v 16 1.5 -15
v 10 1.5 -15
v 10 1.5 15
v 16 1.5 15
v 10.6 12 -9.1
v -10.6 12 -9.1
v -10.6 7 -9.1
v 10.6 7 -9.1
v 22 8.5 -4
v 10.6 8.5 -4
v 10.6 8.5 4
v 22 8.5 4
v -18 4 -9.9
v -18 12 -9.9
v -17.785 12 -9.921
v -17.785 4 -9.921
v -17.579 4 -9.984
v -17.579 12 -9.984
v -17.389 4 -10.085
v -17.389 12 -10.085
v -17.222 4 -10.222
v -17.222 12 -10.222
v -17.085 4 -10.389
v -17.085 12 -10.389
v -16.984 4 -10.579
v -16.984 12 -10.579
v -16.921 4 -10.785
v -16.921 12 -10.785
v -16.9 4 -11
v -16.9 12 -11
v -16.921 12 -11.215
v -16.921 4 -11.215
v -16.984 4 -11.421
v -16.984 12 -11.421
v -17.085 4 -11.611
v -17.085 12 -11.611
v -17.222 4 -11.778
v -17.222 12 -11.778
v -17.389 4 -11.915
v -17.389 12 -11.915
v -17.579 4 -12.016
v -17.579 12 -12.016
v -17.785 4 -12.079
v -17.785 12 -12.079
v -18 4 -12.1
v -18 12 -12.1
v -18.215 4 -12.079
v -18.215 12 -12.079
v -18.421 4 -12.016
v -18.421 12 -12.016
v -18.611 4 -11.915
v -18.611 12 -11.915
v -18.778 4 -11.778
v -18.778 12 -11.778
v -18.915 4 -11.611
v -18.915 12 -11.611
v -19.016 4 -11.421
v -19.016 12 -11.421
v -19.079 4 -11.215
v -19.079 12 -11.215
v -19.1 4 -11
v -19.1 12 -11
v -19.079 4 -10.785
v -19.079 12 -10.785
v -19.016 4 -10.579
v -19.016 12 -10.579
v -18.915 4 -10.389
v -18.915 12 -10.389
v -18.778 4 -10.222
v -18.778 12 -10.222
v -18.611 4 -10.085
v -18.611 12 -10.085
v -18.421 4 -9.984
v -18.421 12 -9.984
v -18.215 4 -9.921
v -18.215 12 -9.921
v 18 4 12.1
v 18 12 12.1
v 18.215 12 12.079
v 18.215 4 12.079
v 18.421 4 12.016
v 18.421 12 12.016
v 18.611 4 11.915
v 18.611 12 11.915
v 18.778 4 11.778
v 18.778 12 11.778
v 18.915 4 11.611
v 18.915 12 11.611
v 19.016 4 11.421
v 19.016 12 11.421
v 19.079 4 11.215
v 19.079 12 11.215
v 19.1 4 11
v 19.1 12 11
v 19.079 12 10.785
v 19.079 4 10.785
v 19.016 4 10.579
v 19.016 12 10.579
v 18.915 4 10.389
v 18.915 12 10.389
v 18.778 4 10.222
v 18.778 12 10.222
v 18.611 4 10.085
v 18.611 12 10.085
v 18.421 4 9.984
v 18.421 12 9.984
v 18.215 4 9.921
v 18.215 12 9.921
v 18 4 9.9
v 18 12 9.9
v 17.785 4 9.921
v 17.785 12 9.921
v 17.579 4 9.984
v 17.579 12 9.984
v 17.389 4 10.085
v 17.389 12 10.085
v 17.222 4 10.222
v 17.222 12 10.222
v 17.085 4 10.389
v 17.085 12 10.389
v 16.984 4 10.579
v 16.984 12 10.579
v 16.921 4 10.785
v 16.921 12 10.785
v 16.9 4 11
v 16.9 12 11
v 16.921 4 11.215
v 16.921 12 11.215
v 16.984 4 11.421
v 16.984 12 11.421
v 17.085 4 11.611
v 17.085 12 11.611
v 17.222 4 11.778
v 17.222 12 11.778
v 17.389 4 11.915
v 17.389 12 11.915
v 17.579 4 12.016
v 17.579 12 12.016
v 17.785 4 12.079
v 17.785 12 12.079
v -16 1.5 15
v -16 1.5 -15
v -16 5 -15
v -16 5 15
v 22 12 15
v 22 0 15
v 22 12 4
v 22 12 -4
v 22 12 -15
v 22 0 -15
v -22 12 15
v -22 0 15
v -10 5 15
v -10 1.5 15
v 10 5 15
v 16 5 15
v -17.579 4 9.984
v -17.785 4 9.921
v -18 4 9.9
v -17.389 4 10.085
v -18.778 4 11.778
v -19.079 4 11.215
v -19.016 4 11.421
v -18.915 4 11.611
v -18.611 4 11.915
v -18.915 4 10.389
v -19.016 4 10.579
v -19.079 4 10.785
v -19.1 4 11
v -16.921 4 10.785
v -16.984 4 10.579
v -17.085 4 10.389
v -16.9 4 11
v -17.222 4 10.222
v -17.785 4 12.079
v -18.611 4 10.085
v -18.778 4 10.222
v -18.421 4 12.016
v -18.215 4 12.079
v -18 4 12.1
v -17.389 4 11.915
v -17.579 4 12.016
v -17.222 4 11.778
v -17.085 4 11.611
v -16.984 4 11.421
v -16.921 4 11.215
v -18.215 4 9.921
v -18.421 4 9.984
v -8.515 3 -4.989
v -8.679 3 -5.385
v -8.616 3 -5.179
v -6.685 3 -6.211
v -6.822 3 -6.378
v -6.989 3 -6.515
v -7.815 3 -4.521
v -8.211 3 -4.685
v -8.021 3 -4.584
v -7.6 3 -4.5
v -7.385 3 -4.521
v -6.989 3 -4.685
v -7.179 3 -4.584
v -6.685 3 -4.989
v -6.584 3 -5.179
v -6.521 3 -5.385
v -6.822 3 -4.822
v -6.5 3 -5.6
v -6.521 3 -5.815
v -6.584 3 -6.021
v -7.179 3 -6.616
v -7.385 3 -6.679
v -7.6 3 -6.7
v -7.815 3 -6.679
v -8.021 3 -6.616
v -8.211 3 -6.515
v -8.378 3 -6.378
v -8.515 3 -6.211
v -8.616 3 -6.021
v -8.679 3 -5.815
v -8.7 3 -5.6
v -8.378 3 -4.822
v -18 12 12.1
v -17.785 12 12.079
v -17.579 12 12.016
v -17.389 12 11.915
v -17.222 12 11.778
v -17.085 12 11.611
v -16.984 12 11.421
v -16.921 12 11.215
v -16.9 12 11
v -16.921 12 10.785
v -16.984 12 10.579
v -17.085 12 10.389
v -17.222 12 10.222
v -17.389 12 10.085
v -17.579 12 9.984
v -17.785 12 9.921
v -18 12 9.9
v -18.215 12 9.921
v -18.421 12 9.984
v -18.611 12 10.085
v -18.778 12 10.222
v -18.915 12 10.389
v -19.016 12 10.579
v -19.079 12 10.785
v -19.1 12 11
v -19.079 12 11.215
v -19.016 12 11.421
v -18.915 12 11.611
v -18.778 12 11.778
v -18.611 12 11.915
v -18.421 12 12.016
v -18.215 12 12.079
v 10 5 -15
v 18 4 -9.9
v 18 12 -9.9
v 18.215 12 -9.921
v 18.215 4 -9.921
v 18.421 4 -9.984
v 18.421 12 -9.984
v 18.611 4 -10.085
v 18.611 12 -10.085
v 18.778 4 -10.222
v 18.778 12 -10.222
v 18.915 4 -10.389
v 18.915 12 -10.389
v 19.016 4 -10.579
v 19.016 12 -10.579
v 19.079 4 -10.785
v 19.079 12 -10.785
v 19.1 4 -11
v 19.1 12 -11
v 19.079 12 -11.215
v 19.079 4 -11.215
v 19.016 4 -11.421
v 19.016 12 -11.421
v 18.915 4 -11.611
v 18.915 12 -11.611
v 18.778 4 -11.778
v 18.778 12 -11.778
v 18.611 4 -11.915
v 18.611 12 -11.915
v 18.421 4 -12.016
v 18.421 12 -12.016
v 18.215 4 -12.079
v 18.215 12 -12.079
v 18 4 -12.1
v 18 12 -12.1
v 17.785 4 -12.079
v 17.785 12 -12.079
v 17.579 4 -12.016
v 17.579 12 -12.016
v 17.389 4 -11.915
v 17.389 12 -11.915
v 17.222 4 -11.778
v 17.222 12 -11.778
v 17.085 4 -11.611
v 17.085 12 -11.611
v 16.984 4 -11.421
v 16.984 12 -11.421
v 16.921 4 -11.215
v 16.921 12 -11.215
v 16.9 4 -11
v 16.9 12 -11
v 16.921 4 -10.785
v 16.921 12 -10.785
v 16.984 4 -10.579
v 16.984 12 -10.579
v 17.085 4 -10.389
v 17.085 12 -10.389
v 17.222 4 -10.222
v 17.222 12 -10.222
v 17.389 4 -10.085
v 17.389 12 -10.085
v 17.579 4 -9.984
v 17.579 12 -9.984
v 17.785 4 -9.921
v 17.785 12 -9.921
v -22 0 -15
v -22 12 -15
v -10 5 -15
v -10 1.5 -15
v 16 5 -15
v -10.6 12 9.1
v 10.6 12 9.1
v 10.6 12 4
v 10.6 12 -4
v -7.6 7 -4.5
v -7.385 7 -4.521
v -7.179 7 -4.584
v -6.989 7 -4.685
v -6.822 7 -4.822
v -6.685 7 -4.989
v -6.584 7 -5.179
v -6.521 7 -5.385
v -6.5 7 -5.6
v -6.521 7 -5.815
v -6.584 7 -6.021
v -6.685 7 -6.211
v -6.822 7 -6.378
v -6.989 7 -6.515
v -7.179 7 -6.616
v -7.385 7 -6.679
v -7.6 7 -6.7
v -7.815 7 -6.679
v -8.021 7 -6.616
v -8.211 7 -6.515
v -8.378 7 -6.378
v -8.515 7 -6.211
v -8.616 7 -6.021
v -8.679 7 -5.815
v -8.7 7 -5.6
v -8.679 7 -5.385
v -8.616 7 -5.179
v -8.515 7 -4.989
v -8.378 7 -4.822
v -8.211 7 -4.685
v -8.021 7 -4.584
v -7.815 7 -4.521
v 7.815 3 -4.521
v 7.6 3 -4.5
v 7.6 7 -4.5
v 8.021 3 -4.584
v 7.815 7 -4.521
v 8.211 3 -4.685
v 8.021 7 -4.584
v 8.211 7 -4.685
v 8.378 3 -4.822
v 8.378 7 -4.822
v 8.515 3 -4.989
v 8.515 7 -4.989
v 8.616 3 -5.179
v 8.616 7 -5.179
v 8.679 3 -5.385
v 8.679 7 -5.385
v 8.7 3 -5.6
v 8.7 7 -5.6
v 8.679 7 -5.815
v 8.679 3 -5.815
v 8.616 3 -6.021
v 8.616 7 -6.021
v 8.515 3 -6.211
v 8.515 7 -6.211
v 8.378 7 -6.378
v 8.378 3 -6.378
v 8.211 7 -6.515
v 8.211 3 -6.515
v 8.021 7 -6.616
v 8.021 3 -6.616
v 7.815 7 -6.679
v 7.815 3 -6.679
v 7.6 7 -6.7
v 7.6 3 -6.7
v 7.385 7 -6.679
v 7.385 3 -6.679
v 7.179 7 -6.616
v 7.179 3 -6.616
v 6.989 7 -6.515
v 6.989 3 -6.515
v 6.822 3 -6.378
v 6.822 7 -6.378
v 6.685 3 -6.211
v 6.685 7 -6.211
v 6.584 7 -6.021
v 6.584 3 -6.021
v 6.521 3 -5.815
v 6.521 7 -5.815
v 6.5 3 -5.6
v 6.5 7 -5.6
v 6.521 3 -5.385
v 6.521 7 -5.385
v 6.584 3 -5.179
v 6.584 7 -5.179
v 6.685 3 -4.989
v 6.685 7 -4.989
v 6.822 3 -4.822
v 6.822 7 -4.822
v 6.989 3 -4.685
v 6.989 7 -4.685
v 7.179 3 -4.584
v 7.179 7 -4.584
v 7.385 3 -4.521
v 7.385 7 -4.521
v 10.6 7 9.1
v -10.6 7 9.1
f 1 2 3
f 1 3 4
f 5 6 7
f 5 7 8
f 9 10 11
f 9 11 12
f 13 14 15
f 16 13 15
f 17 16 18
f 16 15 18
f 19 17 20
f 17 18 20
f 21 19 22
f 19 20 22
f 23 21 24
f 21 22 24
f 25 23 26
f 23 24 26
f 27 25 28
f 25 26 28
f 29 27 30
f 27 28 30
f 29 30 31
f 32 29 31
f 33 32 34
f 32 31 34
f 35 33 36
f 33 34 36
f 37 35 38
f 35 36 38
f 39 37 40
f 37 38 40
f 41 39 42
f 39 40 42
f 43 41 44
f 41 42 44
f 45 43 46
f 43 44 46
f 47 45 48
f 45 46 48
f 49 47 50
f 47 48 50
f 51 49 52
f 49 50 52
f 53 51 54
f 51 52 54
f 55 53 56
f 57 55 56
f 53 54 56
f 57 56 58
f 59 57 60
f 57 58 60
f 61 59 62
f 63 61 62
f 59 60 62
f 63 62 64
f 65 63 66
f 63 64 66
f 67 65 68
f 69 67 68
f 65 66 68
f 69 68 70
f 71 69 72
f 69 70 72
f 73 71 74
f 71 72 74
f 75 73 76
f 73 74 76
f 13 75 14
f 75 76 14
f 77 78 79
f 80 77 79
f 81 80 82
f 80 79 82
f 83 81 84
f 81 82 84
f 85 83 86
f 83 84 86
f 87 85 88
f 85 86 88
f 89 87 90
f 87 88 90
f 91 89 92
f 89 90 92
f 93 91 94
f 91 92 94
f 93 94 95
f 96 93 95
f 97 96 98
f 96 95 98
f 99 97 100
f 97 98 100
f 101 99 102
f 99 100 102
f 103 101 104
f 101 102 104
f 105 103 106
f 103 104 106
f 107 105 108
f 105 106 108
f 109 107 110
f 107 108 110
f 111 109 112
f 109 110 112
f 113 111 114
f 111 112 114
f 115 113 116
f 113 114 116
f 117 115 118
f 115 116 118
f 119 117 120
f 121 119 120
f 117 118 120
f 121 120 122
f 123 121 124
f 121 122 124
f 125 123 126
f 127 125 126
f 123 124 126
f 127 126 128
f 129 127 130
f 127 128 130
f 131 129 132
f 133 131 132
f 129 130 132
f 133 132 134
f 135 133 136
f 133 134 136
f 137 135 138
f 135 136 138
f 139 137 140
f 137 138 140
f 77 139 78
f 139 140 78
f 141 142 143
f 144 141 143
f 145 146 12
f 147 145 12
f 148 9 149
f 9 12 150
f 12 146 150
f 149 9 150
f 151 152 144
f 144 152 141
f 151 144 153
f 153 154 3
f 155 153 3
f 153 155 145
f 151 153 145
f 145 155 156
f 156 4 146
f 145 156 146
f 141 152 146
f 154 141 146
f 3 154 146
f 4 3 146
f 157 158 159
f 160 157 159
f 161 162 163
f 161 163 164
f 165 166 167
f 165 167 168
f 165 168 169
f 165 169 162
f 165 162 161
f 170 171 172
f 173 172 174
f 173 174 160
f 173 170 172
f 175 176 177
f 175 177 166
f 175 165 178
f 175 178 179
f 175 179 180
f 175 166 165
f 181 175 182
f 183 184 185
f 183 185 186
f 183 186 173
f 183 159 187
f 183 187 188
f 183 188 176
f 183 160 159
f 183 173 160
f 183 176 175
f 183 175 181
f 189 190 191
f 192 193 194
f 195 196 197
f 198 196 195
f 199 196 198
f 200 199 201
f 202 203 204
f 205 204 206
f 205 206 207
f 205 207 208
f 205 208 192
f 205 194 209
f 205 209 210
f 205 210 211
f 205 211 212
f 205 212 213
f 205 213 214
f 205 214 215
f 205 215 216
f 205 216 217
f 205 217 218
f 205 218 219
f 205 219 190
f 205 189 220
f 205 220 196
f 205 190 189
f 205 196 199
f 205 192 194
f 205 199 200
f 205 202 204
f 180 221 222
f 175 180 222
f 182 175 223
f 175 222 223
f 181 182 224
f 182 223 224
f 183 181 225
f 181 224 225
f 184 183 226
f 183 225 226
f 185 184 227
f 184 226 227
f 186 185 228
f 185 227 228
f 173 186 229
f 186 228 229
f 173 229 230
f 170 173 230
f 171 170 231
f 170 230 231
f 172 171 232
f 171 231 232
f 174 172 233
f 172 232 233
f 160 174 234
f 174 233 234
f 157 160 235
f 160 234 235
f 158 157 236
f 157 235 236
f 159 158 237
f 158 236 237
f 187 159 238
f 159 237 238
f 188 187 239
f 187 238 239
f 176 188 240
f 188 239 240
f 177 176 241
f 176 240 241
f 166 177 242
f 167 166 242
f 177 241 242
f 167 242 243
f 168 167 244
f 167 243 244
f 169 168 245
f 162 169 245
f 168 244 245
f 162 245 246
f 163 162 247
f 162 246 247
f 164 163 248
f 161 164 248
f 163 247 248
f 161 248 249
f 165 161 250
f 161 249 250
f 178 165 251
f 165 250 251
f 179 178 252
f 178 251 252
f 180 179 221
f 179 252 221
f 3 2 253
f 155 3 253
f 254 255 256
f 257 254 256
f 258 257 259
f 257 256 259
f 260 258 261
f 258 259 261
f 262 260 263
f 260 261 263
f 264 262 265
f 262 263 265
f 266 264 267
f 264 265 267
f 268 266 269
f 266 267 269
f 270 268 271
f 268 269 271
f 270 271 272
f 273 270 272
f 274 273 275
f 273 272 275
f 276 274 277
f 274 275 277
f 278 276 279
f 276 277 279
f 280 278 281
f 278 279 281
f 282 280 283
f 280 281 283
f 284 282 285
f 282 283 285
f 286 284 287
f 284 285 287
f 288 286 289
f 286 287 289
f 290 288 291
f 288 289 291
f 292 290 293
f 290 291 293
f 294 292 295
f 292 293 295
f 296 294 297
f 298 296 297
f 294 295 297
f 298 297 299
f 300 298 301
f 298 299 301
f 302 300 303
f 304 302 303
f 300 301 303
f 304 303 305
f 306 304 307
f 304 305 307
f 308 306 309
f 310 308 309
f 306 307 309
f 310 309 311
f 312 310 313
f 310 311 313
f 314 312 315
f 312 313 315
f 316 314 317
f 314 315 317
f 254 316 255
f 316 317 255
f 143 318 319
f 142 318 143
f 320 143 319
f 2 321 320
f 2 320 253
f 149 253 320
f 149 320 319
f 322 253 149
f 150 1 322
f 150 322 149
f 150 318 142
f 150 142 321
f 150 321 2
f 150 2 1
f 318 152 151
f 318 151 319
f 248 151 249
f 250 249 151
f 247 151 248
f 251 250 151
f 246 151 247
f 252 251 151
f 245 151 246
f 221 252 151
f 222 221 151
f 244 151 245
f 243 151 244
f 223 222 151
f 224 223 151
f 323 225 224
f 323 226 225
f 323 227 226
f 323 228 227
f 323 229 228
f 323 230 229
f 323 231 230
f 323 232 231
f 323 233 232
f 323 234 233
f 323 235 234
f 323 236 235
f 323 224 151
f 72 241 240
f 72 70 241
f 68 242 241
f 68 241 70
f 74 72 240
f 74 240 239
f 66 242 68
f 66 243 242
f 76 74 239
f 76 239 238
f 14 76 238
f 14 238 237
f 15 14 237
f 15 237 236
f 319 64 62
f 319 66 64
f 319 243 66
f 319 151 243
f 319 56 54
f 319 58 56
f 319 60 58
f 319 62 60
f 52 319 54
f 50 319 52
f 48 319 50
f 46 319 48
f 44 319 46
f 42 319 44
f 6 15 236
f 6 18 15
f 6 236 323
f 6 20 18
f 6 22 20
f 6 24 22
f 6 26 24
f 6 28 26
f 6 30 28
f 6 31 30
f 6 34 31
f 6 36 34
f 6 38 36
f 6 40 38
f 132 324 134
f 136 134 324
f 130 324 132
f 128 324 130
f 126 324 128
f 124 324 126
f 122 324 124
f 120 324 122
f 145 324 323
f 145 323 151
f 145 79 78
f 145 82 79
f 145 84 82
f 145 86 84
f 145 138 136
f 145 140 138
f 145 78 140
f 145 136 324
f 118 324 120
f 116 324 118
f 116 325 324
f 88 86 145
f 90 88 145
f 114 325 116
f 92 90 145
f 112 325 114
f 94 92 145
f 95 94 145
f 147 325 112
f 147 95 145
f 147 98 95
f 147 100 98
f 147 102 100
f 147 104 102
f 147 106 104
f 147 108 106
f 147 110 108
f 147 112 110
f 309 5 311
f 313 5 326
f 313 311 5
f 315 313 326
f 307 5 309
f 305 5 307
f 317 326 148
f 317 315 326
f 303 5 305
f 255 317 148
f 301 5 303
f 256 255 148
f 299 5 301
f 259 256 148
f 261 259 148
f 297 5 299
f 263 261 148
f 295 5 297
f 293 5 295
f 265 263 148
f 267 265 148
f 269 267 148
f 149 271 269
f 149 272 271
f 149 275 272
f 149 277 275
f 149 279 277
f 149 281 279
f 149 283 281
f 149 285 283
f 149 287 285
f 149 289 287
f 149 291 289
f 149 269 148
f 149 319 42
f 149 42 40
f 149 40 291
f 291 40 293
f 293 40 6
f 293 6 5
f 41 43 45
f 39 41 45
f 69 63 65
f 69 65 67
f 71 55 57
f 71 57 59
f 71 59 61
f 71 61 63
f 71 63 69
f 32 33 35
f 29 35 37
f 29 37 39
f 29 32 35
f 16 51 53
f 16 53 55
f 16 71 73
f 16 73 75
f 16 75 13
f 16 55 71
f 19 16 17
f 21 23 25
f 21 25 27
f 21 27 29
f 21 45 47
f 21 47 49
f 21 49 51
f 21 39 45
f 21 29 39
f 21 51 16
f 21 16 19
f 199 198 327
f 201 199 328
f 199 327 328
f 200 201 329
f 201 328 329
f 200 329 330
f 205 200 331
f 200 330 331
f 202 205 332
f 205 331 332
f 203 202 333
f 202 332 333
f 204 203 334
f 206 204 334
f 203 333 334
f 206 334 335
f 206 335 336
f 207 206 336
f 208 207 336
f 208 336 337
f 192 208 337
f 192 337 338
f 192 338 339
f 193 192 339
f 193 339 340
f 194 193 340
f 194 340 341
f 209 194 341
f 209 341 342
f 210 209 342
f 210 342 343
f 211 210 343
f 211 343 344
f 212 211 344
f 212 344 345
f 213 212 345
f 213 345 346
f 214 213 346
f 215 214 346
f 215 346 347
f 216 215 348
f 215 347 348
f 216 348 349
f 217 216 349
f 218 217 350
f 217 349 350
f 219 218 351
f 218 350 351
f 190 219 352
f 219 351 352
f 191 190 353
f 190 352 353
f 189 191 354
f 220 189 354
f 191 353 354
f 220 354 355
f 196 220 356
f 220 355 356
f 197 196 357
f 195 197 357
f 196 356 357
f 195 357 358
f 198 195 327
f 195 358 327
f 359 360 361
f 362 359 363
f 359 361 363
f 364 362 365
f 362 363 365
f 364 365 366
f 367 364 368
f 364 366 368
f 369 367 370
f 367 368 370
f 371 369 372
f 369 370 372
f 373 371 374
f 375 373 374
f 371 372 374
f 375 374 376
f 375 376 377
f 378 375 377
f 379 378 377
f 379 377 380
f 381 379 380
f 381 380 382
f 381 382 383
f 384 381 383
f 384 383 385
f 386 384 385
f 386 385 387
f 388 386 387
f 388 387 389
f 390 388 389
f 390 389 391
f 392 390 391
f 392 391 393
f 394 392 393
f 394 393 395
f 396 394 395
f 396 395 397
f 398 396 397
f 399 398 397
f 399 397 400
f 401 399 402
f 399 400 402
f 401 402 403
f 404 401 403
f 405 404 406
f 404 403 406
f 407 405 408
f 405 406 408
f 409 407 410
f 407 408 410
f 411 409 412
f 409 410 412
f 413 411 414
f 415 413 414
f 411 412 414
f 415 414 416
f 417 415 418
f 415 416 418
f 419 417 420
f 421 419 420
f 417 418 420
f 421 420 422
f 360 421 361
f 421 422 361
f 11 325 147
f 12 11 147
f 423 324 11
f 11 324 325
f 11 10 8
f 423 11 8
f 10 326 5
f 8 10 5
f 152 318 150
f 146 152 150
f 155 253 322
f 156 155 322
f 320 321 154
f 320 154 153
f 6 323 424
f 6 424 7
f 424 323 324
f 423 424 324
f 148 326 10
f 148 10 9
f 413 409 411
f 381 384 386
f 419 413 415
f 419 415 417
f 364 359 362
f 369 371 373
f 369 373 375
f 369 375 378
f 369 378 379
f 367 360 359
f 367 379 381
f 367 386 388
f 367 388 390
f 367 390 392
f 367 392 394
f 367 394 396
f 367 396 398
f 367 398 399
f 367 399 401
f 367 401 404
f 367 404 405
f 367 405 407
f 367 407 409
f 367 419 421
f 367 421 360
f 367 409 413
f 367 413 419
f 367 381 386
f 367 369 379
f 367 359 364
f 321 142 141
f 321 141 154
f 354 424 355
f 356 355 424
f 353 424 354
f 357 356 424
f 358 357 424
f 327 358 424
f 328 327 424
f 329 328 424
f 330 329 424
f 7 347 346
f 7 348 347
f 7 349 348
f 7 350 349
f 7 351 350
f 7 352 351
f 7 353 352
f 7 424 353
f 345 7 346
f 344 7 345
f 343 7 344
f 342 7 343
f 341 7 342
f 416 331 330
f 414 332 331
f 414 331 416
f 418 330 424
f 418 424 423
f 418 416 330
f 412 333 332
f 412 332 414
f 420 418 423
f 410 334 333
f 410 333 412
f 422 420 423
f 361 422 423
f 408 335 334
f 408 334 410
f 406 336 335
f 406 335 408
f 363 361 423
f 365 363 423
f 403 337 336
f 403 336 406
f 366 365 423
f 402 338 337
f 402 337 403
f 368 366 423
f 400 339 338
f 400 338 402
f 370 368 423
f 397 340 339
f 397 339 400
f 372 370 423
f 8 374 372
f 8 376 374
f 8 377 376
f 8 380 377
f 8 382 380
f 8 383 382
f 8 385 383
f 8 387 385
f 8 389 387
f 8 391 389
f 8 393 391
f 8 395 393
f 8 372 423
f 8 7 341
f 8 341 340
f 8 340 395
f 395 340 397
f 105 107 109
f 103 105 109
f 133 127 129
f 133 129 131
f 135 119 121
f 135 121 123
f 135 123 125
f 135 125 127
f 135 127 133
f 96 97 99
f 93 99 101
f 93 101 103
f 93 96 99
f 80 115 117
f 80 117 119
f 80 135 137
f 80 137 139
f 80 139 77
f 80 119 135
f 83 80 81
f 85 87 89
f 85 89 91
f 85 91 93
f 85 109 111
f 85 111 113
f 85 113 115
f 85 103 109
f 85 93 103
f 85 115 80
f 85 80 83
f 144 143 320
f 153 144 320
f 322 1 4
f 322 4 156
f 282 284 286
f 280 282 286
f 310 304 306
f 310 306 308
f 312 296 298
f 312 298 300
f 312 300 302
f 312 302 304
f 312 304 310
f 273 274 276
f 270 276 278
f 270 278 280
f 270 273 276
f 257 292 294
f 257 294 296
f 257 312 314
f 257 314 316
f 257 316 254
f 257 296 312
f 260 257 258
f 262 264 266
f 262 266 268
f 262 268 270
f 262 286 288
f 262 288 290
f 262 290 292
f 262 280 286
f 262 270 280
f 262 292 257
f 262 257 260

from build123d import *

# Parameters (mm, degrees)
SKETCH1_W               = 44
SKETCH1_H               = 30
POD_BODY_DEPTH          = 12
SKETCH2_W               = 21.2
SKETCH2_H               = 18.2
BOARD_POCKET_DEPTH      = 5
SKETCH3_R               = 1.1
BOARD_PILOT_HOLES_DEPTH = 9
SKETCH4_R               = 1.1
LID_PILOT_HOLES_DEPTH   = 8
SKETCH5_W               = 12.65
SKETCH5_H               = 8
CABLE_EXIT_DEPTH        = 3.5
STRAP_SLOTS_DEPTH       = 30.206163733
STRAP_SLOTS_DEPTH_BACK  = 30.206163733
SKETCH7_W               = 6
SKETCH7_H               = 3.5


with BuildPart() as part:
    # Sketch1 → Pod Body (new body)
    with BuildSketch(Plane(origin=(0, 0, 0), x_dir=(1, 0, 0), z_dir=(0, 1, 0))):
        Rectangle(SKETCH1_W, SKETCH1_H)
    extrude(amount=POD_BODY_DEPTH)

    # Sketch2 → Board Pocket (cut)
    with BuildSketch(Plane(origin=(0, 12, 0), x_dir=(1, 0, 0), z_dir=(0, 1, 0))):
        Rectangle(SKETCH2_W, SKETCH2_H)
    extrude(amount=-BOARD_POCKET_DEPTH, mode=Mode.SUBTRACT)

    # Sketch3 → Board Pilot Holes (cut)
    with BuildSketch(Plane(origin=(0, 12, 0), x_dir=(1, 0, 0), z_dir=(0, 1, 0))):
        with Locations(Location((-7.6, 5.6, 0), (0, 0, 270))):
            Circle(SKETCH3_R)
        with Locations(Location((7.6, 5.6, 0), (0, 0, 270))):
            Circle(SKETCH3_R)
    extrude(amount=-BOARD_PILOT_HOLES_DEPTH, mode=Mode.SUBTRACT)

    # Sketch4 → Lid Pilot Holes (cut)
    with BuildSketch(Plane(origin=(0, 12, 0), x_dir=(1, 0, 0), z_dir=(0, 1, 0))):
        with Locations(Location((-18, -11, 0), (0, 0, 270))):
            Circle(SKETCH4_R)
        with Locations(Location((-18, 11, 0), (0, 0, 270))):
            Circle(SKETCH4_R)
        with Locations(Location((18, -11, 0), (0, 0, 270))):
            Circle(SKETCH4_R)
        with Locations(Location((18, 11, 0), (0, 0, 270))):
            Circle(SKETCH4_R)
    extrude(amount=-LID_PILOT_HOLES_DEPTH, mode=Mode.SUBTRACT)

    # Sketch5 → Cable Exit (cut)
    with BuildSketch(Plane(origin=(0, 12, 0), x_dir=(1, 0, 0), z_dir=(0, 1, 0))):
        with Locations((16.675, 0)):
            Rectangle(SKETCH5_W, SKETCH5_H)
    extrude(amount=-CABLE_EXIT_DEPTH, mode=Mode.SUBTRACT)

    # Sketch7 → Strap Slots (cut, two sides: drawn at the far end of the back side and taken through both)
    with BuildSketch(Plane.XY.offset(-STRAP_SLOTS_DEPTH_BACK)):
        with Locations((-13, 3.25)):
            Rectangle(SKETCH7_W, SKETCH7_H)
        with Locations((13, 3.25)):
            Rectangle(SKETCH7_W, SKETCH7_H)
    extrude(amount=STRAP_SLOTS_DEPTH + STRAP_SLOTS_DEPTH_BACK, mode=Mode.SUBTRACT)


solid = part.part
